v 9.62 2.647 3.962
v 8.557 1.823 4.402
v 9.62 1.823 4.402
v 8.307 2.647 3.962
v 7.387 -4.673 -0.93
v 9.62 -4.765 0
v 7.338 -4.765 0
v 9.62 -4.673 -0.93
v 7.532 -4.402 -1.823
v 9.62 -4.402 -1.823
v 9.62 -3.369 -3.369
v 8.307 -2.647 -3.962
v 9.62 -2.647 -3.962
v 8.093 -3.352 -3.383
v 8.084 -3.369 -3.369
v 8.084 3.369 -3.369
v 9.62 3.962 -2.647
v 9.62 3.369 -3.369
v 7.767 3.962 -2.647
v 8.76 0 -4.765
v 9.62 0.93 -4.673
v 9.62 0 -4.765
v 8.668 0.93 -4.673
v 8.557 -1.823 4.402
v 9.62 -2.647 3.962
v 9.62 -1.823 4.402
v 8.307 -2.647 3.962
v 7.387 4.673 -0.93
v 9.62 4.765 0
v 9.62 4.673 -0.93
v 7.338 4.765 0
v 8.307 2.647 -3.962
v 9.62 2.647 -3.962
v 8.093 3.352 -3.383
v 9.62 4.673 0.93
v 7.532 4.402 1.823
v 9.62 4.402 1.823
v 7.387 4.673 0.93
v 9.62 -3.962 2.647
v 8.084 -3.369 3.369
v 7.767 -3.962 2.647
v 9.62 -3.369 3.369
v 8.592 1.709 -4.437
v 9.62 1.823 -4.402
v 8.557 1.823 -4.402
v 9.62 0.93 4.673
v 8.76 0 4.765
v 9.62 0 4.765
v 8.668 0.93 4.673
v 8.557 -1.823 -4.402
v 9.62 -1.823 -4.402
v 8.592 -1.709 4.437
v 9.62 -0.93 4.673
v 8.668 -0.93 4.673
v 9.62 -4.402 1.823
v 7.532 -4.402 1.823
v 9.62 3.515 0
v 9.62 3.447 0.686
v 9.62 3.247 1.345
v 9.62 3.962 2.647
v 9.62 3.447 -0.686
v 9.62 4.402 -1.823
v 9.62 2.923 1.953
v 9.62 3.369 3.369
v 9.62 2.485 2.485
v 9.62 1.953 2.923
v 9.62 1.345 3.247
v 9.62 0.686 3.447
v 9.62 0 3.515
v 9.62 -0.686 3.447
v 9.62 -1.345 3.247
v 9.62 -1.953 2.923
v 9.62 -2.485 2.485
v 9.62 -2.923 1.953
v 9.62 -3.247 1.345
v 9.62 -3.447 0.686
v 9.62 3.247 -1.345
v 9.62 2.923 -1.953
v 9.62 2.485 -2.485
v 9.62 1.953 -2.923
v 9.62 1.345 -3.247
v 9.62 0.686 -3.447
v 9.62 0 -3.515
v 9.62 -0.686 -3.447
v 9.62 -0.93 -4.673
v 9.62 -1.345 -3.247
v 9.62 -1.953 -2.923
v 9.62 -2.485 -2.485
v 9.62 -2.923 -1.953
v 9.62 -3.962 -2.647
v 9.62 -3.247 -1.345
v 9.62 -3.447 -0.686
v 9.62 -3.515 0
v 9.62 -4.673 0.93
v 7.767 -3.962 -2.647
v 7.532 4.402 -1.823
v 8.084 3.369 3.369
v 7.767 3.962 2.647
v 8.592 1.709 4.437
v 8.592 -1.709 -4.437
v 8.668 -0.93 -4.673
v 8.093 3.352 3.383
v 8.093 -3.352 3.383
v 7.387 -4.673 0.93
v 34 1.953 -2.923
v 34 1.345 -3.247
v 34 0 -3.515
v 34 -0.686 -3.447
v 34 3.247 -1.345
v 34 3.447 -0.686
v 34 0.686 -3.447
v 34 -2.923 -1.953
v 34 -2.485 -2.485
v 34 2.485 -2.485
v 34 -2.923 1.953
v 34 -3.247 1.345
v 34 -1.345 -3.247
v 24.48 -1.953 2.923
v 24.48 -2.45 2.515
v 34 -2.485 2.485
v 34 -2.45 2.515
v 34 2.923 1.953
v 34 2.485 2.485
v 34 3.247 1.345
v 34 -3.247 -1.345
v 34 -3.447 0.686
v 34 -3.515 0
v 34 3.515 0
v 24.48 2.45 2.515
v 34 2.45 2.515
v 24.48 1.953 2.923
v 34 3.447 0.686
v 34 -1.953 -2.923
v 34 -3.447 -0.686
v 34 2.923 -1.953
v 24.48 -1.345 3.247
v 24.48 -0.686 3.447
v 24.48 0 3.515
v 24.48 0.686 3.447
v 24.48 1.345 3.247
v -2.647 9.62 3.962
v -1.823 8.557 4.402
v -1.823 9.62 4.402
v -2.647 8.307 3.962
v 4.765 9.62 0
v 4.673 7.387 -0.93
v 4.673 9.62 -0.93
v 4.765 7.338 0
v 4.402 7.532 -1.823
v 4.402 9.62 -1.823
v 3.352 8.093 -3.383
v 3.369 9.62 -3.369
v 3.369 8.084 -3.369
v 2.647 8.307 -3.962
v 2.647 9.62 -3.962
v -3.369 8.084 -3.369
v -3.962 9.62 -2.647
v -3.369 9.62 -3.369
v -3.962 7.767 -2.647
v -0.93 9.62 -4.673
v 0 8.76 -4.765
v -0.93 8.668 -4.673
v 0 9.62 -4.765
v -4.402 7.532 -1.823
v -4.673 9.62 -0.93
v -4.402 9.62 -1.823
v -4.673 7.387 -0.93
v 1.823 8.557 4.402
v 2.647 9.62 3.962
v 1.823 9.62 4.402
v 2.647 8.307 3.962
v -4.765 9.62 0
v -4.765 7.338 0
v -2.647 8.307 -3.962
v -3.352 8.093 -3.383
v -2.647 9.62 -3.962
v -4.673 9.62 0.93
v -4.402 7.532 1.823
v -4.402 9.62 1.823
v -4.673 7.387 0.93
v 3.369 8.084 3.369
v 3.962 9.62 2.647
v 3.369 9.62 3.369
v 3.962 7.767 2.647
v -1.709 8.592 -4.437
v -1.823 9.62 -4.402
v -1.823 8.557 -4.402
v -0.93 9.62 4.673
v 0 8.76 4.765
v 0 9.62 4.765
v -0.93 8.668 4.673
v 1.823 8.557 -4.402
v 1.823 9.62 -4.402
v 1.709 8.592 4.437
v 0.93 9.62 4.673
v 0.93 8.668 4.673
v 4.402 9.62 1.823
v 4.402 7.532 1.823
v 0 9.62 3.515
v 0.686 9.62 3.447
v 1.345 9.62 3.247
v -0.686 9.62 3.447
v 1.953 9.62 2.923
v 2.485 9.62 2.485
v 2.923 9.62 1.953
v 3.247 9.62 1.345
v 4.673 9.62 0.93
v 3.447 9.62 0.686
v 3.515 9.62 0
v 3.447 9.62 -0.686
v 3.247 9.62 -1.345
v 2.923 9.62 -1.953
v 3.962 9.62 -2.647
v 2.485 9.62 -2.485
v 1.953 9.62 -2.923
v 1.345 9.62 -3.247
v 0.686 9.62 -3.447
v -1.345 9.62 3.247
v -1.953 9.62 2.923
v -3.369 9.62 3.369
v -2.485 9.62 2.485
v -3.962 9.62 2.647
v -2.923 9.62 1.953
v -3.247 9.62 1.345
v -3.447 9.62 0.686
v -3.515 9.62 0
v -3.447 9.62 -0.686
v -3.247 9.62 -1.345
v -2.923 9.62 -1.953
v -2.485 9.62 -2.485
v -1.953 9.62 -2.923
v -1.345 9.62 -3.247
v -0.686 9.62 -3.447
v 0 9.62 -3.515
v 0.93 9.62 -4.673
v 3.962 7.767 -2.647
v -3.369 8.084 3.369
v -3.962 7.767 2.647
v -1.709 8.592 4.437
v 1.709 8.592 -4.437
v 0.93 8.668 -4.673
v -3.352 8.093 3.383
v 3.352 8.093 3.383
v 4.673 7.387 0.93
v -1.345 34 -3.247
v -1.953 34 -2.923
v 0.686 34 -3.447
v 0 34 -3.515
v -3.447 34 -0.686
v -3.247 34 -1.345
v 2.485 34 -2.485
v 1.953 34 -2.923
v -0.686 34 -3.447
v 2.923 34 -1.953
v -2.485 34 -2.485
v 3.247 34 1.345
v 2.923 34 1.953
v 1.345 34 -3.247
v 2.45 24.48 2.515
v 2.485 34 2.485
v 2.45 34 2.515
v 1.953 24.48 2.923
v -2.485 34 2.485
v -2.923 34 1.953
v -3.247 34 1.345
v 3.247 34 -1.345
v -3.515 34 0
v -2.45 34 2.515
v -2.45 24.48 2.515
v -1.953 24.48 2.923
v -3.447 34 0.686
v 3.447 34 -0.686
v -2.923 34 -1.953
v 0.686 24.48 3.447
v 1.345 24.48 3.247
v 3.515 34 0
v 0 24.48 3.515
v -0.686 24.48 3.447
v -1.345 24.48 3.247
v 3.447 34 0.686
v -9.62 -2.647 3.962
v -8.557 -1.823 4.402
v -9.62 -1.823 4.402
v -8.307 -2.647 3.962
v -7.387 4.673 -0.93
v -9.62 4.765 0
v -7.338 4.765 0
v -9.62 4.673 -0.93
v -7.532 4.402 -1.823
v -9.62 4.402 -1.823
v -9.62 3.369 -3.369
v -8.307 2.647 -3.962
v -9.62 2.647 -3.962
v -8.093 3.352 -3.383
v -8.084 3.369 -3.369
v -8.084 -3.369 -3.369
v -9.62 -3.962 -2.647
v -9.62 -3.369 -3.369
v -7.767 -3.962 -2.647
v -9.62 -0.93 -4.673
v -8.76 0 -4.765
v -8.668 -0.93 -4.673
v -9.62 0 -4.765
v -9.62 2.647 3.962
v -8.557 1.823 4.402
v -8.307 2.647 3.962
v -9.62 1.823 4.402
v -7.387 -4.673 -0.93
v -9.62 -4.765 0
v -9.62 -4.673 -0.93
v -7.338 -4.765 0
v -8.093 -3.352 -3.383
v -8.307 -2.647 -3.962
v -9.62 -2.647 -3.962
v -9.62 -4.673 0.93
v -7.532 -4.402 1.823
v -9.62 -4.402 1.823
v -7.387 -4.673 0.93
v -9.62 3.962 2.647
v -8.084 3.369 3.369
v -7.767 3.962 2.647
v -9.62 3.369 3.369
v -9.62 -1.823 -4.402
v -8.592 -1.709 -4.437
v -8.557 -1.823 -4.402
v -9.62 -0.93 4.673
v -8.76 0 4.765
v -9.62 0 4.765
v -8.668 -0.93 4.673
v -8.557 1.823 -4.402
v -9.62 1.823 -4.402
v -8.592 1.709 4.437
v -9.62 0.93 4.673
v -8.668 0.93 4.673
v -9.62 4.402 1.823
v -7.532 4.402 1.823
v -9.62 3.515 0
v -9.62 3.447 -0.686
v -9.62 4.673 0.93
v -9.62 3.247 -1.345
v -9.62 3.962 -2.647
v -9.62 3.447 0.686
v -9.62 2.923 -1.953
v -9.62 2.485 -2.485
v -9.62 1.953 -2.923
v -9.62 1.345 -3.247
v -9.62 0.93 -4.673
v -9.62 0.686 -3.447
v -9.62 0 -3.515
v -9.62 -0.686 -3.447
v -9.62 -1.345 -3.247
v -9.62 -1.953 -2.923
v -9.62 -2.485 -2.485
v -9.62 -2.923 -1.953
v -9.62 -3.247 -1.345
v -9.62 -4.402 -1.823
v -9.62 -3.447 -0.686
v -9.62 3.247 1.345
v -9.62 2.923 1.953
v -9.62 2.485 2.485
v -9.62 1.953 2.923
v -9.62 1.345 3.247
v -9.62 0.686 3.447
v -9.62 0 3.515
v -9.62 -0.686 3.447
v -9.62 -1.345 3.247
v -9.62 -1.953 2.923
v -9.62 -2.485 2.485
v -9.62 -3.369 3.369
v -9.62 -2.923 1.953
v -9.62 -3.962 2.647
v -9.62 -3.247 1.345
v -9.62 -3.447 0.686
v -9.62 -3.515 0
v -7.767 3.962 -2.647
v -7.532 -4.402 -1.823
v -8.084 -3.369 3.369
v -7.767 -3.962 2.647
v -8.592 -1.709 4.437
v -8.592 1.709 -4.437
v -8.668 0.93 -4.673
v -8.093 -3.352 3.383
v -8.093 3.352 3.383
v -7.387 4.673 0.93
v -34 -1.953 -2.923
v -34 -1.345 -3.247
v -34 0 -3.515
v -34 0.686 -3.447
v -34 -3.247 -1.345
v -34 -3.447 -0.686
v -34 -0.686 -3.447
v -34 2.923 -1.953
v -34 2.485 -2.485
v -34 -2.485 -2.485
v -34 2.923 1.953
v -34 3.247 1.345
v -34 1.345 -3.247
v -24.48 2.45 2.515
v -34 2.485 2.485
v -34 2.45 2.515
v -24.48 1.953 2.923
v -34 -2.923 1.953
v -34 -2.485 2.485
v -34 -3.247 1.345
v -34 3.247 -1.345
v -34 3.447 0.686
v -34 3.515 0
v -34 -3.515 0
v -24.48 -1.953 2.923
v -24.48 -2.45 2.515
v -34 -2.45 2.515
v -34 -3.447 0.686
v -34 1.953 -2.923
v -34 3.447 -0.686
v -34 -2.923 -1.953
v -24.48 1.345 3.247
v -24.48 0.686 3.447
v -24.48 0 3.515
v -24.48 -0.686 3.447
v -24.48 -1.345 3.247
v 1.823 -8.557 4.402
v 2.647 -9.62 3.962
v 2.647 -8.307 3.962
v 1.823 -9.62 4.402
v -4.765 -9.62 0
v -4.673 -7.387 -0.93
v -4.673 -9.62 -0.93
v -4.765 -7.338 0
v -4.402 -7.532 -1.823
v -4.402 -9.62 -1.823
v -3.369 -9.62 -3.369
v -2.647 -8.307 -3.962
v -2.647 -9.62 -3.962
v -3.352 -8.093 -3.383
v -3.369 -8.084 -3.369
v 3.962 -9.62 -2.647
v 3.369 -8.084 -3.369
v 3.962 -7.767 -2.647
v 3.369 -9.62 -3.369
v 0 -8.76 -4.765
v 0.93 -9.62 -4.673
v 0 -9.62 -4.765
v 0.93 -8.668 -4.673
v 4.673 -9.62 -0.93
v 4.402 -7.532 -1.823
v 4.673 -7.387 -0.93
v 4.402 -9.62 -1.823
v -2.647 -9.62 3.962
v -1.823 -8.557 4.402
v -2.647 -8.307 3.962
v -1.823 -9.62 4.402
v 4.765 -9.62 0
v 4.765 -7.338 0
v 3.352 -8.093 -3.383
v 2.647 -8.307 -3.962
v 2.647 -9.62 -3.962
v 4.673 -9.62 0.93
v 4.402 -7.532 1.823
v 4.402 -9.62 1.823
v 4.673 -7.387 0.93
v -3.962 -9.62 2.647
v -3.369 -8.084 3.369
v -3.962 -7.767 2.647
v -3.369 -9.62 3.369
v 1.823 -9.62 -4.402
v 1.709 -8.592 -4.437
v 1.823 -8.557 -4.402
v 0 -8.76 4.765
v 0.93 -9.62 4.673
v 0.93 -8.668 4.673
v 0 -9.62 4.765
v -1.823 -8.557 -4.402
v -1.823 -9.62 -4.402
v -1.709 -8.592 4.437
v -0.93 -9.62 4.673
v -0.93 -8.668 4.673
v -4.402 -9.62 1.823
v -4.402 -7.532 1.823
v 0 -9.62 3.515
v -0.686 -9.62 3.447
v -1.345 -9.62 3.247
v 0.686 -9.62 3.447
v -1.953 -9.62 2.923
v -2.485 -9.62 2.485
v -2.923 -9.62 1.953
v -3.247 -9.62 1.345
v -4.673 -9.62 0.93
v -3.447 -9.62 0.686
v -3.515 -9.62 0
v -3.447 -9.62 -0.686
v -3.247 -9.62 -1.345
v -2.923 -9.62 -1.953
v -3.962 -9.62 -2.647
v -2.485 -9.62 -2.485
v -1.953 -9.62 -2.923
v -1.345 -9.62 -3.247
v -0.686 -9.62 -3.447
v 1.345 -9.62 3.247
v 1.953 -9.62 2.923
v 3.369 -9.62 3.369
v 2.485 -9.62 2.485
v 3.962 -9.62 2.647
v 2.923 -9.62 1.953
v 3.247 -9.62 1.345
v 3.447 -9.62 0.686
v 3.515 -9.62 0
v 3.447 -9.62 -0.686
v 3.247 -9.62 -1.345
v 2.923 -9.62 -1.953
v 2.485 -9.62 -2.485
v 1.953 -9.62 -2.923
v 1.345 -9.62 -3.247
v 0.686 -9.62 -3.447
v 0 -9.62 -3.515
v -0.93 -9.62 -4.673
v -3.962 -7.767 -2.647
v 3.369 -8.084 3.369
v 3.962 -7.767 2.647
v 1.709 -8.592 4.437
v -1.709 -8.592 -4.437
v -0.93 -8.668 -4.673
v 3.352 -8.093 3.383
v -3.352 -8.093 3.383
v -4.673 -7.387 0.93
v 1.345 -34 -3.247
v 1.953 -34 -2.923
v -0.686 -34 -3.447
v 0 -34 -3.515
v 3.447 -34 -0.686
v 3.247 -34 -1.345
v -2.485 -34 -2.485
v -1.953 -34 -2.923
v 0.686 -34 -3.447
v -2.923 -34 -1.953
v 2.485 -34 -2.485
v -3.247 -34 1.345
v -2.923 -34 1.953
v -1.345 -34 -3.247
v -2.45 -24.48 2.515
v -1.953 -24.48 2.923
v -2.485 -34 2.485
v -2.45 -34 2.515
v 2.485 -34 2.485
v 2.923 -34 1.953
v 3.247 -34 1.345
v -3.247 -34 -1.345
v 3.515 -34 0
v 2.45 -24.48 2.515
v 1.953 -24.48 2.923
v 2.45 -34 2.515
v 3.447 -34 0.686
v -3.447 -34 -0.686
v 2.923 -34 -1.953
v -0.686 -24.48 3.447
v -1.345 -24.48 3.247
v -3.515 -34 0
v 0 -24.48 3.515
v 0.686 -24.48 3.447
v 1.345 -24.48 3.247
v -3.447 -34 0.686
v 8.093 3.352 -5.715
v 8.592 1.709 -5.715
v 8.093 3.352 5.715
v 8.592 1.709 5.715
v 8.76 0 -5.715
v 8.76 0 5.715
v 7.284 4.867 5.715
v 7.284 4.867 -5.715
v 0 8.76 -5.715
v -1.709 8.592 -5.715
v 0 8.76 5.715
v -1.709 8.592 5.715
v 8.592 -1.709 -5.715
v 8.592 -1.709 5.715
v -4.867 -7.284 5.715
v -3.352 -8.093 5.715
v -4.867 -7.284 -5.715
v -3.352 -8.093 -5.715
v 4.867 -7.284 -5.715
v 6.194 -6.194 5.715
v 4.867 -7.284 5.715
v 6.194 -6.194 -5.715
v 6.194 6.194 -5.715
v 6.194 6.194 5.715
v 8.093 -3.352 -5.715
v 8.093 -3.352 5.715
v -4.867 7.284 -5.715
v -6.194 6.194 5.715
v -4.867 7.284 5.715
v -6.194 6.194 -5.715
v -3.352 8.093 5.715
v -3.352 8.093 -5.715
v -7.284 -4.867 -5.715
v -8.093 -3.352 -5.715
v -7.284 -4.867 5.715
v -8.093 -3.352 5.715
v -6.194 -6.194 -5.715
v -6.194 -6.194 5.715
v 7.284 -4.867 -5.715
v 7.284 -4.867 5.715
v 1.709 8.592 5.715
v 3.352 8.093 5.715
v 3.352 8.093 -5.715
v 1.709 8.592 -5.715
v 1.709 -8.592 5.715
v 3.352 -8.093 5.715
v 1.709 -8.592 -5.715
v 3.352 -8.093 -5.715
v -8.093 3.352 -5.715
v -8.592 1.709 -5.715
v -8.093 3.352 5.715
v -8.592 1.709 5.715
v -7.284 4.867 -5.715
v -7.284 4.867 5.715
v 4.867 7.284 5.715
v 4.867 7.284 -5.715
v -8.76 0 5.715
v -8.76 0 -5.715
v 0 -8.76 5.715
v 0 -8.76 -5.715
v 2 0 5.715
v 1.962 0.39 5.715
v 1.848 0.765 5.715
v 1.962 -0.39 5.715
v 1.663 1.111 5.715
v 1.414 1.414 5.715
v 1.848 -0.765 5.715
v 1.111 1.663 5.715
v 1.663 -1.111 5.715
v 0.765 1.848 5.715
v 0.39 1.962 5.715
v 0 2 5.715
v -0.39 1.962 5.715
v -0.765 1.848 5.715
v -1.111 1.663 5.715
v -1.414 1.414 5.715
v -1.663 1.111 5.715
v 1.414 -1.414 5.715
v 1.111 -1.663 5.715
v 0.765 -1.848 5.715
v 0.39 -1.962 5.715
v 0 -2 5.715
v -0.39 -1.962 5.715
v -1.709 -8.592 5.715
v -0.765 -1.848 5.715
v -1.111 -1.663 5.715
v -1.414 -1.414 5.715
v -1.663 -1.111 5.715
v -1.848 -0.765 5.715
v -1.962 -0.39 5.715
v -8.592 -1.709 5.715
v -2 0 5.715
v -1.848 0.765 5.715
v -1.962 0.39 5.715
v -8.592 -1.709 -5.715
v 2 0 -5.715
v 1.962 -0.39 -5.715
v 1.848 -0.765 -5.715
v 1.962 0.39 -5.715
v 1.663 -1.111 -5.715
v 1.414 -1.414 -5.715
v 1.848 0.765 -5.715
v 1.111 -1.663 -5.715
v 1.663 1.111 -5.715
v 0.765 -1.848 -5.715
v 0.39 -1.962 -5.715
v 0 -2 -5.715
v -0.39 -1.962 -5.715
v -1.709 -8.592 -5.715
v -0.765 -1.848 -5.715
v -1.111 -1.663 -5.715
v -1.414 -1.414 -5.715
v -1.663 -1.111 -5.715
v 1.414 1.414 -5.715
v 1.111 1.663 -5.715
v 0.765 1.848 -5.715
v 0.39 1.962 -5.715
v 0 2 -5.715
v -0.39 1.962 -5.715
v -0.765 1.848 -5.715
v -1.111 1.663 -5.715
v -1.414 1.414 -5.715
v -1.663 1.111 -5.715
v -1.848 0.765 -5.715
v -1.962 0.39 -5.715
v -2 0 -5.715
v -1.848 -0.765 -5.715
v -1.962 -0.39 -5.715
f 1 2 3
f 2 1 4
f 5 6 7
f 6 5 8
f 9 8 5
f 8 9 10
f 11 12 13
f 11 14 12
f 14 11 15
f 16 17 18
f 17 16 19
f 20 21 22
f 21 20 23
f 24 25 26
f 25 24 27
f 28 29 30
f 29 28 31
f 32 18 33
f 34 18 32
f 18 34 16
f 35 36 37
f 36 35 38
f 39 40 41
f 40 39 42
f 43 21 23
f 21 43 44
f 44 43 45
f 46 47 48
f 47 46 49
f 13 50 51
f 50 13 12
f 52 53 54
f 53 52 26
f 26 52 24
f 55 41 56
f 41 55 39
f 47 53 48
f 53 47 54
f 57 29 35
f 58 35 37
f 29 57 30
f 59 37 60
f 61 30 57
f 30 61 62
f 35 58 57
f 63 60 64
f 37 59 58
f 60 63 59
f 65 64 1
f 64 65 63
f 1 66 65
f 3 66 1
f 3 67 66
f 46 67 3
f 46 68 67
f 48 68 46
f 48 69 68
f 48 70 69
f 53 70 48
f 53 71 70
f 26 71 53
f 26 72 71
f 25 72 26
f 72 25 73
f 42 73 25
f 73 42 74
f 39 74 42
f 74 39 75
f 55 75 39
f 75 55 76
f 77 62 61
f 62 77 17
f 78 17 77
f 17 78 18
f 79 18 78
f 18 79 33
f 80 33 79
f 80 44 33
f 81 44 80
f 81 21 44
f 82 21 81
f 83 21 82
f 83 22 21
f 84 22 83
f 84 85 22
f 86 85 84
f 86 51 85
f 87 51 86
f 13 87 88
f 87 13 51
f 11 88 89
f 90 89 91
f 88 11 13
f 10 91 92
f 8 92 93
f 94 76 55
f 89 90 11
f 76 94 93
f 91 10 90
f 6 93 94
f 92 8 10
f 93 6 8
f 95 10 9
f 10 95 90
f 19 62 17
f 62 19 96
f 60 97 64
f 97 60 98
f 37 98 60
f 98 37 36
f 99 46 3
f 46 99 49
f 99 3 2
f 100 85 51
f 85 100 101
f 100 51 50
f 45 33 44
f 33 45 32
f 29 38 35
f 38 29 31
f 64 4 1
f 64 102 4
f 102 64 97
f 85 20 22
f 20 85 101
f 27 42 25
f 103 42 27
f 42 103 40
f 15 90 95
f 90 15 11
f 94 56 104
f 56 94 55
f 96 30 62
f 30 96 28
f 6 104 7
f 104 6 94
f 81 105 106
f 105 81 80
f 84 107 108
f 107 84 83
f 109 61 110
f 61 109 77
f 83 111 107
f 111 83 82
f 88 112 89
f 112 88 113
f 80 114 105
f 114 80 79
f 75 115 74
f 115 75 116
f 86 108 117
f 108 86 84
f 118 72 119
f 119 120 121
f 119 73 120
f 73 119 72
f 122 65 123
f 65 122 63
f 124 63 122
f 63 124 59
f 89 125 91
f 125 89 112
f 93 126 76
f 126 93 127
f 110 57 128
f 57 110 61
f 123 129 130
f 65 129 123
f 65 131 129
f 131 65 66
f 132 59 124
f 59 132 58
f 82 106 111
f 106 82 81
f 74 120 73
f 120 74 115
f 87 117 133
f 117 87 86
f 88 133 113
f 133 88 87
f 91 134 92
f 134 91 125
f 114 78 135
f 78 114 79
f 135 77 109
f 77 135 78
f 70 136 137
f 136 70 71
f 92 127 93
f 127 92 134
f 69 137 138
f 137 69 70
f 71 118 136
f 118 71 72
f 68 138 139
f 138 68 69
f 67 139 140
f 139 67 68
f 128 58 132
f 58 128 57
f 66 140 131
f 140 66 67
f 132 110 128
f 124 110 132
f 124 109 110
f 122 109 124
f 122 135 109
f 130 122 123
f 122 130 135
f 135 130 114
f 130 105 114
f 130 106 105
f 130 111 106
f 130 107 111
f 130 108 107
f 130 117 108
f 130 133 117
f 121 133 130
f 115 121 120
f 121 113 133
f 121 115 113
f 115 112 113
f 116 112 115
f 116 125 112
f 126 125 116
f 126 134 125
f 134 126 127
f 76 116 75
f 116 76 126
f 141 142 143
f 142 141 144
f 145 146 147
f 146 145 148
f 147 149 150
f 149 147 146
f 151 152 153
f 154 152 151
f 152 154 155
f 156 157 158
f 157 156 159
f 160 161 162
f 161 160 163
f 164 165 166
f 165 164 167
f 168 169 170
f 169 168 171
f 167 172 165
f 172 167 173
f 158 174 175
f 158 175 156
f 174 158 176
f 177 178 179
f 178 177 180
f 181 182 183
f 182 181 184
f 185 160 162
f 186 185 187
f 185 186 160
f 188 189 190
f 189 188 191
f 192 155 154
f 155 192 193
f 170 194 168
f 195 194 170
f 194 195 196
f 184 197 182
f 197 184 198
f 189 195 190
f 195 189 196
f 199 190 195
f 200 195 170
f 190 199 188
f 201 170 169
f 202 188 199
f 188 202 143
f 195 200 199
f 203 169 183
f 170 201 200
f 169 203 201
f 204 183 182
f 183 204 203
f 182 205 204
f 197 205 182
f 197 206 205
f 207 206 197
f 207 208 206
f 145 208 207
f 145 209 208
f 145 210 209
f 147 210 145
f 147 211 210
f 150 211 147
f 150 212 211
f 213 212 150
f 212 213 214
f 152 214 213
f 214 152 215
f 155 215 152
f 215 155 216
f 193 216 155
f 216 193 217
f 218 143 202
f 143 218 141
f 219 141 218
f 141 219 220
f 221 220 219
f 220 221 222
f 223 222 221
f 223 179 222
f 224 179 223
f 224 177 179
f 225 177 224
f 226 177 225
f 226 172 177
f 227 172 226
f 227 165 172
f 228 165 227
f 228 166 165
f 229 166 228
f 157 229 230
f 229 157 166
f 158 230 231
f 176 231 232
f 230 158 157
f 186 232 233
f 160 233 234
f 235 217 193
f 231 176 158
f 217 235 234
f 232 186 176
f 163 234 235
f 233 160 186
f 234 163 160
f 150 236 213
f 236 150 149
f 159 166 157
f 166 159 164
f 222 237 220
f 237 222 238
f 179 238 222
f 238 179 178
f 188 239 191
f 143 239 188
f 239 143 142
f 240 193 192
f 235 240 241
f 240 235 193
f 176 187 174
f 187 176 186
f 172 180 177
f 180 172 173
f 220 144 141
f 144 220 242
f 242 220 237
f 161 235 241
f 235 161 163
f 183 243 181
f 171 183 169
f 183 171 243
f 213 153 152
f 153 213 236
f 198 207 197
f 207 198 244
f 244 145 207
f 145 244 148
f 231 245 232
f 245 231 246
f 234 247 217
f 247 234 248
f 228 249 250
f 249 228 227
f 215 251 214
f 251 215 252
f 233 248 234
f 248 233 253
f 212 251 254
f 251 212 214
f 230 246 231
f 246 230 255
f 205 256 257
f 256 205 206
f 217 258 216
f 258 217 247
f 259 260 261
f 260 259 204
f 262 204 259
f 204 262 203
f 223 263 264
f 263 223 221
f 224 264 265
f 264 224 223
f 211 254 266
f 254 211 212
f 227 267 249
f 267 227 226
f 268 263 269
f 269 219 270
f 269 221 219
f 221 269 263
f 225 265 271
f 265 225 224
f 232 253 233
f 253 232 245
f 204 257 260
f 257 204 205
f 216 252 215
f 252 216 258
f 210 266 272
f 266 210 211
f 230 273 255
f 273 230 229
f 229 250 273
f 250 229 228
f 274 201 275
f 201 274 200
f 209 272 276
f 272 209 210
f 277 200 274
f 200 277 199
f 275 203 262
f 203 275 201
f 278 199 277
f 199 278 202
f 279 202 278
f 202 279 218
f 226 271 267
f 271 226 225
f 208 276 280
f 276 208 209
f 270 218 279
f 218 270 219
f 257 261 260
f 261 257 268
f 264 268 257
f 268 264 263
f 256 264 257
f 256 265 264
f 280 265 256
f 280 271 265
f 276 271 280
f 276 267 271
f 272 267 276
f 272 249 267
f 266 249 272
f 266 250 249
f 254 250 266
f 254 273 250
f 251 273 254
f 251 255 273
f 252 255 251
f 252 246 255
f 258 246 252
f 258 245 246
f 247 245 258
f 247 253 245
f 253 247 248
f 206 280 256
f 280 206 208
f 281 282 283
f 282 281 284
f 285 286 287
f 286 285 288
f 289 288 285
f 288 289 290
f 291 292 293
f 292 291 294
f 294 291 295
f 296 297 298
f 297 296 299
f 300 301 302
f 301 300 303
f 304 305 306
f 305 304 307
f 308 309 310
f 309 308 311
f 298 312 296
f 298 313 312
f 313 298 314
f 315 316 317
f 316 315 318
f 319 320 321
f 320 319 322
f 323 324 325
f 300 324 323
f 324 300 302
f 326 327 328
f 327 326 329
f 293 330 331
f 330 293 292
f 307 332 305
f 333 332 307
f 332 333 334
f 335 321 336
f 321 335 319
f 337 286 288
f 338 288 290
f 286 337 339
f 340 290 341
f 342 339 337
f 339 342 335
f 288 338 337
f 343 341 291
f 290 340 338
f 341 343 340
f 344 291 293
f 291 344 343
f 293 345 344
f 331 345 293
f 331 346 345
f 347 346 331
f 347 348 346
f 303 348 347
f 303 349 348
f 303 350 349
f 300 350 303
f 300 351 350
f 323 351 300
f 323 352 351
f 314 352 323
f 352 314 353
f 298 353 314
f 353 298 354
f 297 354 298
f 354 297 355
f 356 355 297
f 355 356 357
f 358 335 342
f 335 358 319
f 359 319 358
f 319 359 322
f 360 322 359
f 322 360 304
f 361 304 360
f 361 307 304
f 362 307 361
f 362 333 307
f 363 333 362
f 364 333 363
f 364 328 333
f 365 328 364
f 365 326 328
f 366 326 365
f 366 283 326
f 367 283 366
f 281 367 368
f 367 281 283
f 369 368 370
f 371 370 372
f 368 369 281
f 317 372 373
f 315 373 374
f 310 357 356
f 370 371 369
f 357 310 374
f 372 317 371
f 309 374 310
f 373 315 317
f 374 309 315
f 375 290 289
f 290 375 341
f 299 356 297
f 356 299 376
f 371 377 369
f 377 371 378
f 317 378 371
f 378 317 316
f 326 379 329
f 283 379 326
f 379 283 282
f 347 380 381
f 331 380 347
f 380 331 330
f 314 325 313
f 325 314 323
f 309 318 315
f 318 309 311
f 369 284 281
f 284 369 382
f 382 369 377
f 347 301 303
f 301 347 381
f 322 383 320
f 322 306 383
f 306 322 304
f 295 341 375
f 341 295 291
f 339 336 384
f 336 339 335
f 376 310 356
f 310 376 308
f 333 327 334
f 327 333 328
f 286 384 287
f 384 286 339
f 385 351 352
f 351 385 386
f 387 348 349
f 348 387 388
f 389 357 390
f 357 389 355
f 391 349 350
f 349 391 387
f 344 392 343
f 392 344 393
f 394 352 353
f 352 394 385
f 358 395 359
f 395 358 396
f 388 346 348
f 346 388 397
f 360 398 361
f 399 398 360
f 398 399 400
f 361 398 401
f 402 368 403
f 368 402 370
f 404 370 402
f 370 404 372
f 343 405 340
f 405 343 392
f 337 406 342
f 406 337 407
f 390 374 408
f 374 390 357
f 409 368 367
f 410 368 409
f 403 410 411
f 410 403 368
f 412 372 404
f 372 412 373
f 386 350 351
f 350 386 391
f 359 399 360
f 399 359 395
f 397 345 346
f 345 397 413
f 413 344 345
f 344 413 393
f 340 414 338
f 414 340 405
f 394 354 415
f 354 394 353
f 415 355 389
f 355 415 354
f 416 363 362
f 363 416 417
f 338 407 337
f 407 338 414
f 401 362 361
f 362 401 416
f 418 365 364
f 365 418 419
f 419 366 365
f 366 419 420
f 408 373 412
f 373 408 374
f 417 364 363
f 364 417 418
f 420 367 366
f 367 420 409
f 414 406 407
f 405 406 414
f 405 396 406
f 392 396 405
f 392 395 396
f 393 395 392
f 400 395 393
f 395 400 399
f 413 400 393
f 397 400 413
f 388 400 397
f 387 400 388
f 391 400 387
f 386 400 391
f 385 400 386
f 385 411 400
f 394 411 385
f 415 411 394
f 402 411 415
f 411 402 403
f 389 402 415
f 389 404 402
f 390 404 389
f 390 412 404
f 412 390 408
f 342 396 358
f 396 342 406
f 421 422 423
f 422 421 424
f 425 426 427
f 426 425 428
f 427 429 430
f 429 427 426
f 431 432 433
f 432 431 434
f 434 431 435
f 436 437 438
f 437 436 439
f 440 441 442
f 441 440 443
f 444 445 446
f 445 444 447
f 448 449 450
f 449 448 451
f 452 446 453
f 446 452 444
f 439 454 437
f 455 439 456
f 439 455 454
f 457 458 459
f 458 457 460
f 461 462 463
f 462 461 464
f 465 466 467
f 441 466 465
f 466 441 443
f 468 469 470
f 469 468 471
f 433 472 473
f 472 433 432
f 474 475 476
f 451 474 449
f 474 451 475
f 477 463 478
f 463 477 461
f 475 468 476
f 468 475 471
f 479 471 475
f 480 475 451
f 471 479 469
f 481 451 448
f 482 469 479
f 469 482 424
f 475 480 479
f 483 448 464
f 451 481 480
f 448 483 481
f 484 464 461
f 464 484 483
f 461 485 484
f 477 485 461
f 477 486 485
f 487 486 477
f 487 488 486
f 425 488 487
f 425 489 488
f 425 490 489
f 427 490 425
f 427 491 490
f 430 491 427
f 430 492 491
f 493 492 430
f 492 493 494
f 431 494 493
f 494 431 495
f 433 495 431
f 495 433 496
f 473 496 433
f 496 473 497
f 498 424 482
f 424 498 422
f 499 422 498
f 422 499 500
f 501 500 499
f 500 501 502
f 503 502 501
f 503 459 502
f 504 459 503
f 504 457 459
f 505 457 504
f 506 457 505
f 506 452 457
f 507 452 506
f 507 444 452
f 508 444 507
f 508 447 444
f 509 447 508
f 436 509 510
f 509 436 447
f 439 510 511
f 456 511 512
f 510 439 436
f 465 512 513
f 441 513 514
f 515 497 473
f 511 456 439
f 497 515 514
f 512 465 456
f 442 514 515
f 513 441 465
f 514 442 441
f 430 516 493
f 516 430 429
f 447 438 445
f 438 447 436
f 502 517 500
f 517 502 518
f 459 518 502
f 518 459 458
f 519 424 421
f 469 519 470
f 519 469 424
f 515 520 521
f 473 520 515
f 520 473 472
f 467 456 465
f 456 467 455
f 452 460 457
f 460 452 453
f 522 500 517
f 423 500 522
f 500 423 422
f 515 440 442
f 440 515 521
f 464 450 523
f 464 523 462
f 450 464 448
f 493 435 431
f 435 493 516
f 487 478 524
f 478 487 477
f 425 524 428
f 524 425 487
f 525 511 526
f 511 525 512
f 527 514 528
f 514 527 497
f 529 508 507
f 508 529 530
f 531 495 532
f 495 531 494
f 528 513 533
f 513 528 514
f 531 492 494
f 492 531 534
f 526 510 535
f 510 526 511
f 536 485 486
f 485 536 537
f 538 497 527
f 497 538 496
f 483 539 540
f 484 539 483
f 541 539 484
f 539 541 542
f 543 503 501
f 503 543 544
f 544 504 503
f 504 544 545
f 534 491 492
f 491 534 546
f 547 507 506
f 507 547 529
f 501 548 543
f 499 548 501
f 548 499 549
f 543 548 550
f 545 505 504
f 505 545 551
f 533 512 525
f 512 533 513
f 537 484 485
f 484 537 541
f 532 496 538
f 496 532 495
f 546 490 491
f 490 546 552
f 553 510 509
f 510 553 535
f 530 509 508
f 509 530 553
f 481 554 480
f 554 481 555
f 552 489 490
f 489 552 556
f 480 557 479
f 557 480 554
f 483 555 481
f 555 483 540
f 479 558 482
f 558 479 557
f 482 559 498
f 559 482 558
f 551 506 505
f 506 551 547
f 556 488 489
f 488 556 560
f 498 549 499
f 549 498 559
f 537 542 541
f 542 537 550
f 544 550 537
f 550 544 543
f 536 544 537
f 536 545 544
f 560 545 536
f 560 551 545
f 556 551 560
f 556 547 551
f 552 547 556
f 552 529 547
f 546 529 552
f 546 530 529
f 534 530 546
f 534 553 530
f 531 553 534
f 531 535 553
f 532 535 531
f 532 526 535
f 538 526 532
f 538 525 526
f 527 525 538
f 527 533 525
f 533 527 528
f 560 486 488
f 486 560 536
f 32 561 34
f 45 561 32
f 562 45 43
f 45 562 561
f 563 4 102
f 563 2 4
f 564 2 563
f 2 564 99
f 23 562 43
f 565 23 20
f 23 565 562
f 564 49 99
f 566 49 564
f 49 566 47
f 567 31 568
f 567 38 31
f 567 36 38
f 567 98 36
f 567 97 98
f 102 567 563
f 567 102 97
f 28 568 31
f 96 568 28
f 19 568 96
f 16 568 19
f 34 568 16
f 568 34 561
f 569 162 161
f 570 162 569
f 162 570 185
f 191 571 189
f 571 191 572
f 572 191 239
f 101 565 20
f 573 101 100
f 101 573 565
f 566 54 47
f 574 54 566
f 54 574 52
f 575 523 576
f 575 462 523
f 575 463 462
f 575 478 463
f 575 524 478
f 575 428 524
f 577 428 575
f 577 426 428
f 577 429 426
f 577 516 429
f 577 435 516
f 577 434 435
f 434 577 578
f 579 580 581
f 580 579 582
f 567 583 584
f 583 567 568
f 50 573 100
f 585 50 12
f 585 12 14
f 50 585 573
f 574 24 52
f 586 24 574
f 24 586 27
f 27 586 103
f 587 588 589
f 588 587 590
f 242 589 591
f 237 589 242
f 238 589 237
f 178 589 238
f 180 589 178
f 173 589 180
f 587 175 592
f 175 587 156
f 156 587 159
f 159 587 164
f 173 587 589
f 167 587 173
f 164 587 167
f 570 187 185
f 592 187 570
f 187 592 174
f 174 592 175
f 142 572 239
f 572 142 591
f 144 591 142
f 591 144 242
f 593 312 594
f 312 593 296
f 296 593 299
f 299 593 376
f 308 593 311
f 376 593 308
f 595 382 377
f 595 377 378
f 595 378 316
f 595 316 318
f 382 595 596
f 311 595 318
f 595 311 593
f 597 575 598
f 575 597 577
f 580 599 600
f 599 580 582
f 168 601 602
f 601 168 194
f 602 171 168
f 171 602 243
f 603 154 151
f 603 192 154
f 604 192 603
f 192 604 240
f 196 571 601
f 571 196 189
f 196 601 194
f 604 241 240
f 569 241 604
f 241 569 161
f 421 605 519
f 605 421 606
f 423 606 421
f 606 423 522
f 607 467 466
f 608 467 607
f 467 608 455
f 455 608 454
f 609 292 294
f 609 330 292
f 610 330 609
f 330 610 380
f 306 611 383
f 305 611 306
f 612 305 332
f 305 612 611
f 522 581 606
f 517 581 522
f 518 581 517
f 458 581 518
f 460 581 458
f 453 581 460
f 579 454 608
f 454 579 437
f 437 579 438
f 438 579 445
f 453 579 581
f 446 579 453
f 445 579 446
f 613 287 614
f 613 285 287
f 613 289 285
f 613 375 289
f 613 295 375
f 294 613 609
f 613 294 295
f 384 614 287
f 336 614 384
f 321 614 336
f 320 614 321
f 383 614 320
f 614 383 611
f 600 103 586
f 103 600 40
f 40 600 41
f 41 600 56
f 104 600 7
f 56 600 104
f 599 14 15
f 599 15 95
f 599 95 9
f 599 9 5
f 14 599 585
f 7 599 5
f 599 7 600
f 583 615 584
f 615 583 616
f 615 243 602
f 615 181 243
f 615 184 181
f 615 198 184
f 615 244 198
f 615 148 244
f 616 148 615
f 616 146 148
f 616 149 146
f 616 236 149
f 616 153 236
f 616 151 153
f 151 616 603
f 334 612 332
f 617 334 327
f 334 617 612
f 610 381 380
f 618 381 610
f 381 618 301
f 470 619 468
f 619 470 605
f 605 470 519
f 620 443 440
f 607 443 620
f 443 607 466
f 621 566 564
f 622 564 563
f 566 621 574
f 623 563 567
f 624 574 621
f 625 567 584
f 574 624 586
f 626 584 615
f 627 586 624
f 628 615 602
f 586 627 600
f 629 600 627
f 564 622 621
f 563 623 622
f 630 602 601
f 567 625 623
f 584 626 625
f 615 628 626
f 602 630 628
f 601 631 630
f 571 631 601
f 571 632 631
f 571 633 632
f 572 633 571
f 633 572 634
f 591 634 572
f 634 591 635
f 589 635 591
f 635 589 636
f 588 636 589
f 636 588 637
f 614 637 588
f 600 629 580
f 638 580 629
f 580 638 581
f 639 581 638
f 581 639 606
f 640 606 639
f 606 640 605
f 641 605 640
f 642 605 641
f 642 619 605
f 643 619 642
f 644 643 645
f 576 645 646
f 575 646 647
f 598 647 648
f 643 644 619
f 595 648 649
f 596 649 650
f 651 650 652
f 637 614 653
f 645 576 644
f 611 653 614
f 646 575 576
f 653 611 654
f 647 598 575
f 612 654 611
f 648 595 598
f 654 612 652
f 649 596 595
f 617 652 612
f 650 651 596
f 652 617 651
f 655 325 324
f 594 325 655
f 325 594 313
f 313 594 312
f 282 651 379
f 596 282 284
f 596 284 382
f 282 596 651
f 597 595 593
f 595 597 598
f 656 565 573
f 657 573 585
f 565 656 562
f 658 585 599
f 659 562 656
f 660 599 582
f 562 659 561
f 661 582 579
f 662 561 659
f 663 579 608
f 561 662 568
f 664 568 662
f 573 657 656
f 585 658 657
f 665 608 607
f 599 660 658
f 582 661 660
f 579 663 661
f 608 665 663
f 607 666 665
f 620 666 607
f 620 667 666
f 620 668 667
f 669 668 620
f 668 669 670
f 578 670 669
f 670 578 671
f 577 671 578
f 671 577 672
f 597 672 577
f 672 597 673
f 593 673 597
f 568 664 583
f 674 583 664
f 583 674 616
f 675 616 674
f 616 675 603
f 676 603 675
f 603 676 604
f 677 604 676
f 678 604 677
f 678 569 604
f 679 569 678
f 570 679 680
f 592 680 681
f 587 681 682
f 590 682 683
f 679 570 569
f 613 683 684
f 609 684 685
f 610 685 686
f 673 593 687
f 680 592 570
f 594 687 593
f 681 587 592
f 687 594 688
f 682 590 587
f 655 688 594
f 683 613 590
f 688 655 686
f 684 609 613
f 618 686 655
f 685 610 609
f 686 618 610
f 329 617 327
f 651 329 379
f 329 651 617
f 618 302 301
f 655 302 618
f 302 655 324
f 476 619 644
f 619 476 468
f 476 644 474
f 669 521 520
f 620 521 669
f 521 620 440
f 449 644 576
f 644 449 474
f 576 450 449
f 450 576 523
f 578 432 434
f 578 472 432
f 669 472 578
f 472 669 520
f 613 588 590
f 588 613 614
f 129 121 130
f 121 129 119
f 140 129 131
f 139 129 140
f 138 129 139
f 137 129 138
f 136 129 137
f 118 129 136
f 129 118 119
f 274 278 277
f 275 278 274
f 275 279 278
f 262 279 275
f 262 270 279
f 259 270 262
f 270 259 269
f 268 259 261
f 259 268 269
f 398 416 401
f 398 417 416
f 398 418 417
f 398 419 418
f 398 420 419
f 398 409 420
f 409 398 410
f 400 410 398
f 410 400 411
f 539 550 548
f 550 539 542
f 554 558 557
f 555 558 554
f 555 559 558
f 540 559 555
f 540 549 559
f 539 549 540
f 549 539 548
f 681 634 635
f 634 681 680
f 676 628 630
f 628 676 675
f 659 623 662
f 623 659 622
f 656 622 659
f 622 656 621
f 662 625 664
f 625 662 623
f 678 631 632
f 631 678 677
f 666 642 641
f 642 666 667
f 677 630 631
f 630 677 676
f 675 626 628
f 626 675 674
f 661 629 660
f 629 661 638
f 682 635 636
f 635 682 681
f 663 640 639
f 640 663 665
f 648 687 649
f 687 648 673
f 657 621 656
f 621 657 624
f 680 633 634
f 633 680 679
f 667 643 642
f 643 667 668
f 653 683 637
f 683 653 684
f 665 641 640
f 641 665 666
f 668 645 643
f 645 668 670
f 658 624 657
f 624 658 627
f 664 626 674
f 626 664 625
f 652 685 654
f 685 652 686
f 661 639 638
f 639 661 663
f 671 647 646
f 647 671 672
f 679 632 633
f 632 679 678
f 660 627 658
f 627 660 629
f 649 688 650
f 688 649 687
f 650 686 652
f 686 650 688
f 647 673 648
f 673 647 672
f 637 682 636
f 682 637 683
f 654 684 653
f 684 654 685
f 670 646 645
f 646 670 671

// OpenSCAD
$fn = 32;

// ----------------------------------------------------------------------
// Cardan cross: 68 mm span, 9.53 mm trunnions
// ----------------------------------------------------------------------

// --- parameters (mm) ---
journal_d = 9.53;         // trunnion diameter
arm_len = 34;             // trunnion length from the centre
step_r = 3.24;            // step position from the centre
step_d = 7.03;            // journal diameter after the step
hub_d = 17.52;            // hub diameter
hub_h = 11.43;            // hub height
bore_d = 4;               // hub bore
flat_d = 1;               // depth of the journal flat
flat_len = 9.52;          // length of the journal flat

difference() {
  union() {
    /* hub along the joint axis */
    cylinder(h = hub_h, d = hub_d, center = true);
    for (a = [0 : 90 : 270]) rotate([0, 0, a]) {
      /* trunnion, sunk into the hub */
      translate([hub_d / 4, 0, 0]) rotate([0, 90, 0]) cylinder(h = step_r + 2, d = journal_d);
      /* stepped journal out to the tip */
      translate([step_r - 0.5, 0, 0]) rotate([0, 90, 0]) cylinder(h = arm_len + 0.5 - step_r, d = step_d);
    }
  }
  /* lubrication bore through the hub, 2.5 mm clear on both sides */
  translate([0, 0, -hub_h / 2 - 2.5]) cylinder(h = hub_h + 5, d = bore_d);
  /* machined flat on each journal tip */
  for (a = [0 : 90 : 270]) rotate([0, 0, a]) {
    translate([arm_len - flat_len, -step_d, step_d / 2 - flat_d]) cube([flat_len + 0.5, 2 * step_d, flat_d + 2.5]);
  }
}
